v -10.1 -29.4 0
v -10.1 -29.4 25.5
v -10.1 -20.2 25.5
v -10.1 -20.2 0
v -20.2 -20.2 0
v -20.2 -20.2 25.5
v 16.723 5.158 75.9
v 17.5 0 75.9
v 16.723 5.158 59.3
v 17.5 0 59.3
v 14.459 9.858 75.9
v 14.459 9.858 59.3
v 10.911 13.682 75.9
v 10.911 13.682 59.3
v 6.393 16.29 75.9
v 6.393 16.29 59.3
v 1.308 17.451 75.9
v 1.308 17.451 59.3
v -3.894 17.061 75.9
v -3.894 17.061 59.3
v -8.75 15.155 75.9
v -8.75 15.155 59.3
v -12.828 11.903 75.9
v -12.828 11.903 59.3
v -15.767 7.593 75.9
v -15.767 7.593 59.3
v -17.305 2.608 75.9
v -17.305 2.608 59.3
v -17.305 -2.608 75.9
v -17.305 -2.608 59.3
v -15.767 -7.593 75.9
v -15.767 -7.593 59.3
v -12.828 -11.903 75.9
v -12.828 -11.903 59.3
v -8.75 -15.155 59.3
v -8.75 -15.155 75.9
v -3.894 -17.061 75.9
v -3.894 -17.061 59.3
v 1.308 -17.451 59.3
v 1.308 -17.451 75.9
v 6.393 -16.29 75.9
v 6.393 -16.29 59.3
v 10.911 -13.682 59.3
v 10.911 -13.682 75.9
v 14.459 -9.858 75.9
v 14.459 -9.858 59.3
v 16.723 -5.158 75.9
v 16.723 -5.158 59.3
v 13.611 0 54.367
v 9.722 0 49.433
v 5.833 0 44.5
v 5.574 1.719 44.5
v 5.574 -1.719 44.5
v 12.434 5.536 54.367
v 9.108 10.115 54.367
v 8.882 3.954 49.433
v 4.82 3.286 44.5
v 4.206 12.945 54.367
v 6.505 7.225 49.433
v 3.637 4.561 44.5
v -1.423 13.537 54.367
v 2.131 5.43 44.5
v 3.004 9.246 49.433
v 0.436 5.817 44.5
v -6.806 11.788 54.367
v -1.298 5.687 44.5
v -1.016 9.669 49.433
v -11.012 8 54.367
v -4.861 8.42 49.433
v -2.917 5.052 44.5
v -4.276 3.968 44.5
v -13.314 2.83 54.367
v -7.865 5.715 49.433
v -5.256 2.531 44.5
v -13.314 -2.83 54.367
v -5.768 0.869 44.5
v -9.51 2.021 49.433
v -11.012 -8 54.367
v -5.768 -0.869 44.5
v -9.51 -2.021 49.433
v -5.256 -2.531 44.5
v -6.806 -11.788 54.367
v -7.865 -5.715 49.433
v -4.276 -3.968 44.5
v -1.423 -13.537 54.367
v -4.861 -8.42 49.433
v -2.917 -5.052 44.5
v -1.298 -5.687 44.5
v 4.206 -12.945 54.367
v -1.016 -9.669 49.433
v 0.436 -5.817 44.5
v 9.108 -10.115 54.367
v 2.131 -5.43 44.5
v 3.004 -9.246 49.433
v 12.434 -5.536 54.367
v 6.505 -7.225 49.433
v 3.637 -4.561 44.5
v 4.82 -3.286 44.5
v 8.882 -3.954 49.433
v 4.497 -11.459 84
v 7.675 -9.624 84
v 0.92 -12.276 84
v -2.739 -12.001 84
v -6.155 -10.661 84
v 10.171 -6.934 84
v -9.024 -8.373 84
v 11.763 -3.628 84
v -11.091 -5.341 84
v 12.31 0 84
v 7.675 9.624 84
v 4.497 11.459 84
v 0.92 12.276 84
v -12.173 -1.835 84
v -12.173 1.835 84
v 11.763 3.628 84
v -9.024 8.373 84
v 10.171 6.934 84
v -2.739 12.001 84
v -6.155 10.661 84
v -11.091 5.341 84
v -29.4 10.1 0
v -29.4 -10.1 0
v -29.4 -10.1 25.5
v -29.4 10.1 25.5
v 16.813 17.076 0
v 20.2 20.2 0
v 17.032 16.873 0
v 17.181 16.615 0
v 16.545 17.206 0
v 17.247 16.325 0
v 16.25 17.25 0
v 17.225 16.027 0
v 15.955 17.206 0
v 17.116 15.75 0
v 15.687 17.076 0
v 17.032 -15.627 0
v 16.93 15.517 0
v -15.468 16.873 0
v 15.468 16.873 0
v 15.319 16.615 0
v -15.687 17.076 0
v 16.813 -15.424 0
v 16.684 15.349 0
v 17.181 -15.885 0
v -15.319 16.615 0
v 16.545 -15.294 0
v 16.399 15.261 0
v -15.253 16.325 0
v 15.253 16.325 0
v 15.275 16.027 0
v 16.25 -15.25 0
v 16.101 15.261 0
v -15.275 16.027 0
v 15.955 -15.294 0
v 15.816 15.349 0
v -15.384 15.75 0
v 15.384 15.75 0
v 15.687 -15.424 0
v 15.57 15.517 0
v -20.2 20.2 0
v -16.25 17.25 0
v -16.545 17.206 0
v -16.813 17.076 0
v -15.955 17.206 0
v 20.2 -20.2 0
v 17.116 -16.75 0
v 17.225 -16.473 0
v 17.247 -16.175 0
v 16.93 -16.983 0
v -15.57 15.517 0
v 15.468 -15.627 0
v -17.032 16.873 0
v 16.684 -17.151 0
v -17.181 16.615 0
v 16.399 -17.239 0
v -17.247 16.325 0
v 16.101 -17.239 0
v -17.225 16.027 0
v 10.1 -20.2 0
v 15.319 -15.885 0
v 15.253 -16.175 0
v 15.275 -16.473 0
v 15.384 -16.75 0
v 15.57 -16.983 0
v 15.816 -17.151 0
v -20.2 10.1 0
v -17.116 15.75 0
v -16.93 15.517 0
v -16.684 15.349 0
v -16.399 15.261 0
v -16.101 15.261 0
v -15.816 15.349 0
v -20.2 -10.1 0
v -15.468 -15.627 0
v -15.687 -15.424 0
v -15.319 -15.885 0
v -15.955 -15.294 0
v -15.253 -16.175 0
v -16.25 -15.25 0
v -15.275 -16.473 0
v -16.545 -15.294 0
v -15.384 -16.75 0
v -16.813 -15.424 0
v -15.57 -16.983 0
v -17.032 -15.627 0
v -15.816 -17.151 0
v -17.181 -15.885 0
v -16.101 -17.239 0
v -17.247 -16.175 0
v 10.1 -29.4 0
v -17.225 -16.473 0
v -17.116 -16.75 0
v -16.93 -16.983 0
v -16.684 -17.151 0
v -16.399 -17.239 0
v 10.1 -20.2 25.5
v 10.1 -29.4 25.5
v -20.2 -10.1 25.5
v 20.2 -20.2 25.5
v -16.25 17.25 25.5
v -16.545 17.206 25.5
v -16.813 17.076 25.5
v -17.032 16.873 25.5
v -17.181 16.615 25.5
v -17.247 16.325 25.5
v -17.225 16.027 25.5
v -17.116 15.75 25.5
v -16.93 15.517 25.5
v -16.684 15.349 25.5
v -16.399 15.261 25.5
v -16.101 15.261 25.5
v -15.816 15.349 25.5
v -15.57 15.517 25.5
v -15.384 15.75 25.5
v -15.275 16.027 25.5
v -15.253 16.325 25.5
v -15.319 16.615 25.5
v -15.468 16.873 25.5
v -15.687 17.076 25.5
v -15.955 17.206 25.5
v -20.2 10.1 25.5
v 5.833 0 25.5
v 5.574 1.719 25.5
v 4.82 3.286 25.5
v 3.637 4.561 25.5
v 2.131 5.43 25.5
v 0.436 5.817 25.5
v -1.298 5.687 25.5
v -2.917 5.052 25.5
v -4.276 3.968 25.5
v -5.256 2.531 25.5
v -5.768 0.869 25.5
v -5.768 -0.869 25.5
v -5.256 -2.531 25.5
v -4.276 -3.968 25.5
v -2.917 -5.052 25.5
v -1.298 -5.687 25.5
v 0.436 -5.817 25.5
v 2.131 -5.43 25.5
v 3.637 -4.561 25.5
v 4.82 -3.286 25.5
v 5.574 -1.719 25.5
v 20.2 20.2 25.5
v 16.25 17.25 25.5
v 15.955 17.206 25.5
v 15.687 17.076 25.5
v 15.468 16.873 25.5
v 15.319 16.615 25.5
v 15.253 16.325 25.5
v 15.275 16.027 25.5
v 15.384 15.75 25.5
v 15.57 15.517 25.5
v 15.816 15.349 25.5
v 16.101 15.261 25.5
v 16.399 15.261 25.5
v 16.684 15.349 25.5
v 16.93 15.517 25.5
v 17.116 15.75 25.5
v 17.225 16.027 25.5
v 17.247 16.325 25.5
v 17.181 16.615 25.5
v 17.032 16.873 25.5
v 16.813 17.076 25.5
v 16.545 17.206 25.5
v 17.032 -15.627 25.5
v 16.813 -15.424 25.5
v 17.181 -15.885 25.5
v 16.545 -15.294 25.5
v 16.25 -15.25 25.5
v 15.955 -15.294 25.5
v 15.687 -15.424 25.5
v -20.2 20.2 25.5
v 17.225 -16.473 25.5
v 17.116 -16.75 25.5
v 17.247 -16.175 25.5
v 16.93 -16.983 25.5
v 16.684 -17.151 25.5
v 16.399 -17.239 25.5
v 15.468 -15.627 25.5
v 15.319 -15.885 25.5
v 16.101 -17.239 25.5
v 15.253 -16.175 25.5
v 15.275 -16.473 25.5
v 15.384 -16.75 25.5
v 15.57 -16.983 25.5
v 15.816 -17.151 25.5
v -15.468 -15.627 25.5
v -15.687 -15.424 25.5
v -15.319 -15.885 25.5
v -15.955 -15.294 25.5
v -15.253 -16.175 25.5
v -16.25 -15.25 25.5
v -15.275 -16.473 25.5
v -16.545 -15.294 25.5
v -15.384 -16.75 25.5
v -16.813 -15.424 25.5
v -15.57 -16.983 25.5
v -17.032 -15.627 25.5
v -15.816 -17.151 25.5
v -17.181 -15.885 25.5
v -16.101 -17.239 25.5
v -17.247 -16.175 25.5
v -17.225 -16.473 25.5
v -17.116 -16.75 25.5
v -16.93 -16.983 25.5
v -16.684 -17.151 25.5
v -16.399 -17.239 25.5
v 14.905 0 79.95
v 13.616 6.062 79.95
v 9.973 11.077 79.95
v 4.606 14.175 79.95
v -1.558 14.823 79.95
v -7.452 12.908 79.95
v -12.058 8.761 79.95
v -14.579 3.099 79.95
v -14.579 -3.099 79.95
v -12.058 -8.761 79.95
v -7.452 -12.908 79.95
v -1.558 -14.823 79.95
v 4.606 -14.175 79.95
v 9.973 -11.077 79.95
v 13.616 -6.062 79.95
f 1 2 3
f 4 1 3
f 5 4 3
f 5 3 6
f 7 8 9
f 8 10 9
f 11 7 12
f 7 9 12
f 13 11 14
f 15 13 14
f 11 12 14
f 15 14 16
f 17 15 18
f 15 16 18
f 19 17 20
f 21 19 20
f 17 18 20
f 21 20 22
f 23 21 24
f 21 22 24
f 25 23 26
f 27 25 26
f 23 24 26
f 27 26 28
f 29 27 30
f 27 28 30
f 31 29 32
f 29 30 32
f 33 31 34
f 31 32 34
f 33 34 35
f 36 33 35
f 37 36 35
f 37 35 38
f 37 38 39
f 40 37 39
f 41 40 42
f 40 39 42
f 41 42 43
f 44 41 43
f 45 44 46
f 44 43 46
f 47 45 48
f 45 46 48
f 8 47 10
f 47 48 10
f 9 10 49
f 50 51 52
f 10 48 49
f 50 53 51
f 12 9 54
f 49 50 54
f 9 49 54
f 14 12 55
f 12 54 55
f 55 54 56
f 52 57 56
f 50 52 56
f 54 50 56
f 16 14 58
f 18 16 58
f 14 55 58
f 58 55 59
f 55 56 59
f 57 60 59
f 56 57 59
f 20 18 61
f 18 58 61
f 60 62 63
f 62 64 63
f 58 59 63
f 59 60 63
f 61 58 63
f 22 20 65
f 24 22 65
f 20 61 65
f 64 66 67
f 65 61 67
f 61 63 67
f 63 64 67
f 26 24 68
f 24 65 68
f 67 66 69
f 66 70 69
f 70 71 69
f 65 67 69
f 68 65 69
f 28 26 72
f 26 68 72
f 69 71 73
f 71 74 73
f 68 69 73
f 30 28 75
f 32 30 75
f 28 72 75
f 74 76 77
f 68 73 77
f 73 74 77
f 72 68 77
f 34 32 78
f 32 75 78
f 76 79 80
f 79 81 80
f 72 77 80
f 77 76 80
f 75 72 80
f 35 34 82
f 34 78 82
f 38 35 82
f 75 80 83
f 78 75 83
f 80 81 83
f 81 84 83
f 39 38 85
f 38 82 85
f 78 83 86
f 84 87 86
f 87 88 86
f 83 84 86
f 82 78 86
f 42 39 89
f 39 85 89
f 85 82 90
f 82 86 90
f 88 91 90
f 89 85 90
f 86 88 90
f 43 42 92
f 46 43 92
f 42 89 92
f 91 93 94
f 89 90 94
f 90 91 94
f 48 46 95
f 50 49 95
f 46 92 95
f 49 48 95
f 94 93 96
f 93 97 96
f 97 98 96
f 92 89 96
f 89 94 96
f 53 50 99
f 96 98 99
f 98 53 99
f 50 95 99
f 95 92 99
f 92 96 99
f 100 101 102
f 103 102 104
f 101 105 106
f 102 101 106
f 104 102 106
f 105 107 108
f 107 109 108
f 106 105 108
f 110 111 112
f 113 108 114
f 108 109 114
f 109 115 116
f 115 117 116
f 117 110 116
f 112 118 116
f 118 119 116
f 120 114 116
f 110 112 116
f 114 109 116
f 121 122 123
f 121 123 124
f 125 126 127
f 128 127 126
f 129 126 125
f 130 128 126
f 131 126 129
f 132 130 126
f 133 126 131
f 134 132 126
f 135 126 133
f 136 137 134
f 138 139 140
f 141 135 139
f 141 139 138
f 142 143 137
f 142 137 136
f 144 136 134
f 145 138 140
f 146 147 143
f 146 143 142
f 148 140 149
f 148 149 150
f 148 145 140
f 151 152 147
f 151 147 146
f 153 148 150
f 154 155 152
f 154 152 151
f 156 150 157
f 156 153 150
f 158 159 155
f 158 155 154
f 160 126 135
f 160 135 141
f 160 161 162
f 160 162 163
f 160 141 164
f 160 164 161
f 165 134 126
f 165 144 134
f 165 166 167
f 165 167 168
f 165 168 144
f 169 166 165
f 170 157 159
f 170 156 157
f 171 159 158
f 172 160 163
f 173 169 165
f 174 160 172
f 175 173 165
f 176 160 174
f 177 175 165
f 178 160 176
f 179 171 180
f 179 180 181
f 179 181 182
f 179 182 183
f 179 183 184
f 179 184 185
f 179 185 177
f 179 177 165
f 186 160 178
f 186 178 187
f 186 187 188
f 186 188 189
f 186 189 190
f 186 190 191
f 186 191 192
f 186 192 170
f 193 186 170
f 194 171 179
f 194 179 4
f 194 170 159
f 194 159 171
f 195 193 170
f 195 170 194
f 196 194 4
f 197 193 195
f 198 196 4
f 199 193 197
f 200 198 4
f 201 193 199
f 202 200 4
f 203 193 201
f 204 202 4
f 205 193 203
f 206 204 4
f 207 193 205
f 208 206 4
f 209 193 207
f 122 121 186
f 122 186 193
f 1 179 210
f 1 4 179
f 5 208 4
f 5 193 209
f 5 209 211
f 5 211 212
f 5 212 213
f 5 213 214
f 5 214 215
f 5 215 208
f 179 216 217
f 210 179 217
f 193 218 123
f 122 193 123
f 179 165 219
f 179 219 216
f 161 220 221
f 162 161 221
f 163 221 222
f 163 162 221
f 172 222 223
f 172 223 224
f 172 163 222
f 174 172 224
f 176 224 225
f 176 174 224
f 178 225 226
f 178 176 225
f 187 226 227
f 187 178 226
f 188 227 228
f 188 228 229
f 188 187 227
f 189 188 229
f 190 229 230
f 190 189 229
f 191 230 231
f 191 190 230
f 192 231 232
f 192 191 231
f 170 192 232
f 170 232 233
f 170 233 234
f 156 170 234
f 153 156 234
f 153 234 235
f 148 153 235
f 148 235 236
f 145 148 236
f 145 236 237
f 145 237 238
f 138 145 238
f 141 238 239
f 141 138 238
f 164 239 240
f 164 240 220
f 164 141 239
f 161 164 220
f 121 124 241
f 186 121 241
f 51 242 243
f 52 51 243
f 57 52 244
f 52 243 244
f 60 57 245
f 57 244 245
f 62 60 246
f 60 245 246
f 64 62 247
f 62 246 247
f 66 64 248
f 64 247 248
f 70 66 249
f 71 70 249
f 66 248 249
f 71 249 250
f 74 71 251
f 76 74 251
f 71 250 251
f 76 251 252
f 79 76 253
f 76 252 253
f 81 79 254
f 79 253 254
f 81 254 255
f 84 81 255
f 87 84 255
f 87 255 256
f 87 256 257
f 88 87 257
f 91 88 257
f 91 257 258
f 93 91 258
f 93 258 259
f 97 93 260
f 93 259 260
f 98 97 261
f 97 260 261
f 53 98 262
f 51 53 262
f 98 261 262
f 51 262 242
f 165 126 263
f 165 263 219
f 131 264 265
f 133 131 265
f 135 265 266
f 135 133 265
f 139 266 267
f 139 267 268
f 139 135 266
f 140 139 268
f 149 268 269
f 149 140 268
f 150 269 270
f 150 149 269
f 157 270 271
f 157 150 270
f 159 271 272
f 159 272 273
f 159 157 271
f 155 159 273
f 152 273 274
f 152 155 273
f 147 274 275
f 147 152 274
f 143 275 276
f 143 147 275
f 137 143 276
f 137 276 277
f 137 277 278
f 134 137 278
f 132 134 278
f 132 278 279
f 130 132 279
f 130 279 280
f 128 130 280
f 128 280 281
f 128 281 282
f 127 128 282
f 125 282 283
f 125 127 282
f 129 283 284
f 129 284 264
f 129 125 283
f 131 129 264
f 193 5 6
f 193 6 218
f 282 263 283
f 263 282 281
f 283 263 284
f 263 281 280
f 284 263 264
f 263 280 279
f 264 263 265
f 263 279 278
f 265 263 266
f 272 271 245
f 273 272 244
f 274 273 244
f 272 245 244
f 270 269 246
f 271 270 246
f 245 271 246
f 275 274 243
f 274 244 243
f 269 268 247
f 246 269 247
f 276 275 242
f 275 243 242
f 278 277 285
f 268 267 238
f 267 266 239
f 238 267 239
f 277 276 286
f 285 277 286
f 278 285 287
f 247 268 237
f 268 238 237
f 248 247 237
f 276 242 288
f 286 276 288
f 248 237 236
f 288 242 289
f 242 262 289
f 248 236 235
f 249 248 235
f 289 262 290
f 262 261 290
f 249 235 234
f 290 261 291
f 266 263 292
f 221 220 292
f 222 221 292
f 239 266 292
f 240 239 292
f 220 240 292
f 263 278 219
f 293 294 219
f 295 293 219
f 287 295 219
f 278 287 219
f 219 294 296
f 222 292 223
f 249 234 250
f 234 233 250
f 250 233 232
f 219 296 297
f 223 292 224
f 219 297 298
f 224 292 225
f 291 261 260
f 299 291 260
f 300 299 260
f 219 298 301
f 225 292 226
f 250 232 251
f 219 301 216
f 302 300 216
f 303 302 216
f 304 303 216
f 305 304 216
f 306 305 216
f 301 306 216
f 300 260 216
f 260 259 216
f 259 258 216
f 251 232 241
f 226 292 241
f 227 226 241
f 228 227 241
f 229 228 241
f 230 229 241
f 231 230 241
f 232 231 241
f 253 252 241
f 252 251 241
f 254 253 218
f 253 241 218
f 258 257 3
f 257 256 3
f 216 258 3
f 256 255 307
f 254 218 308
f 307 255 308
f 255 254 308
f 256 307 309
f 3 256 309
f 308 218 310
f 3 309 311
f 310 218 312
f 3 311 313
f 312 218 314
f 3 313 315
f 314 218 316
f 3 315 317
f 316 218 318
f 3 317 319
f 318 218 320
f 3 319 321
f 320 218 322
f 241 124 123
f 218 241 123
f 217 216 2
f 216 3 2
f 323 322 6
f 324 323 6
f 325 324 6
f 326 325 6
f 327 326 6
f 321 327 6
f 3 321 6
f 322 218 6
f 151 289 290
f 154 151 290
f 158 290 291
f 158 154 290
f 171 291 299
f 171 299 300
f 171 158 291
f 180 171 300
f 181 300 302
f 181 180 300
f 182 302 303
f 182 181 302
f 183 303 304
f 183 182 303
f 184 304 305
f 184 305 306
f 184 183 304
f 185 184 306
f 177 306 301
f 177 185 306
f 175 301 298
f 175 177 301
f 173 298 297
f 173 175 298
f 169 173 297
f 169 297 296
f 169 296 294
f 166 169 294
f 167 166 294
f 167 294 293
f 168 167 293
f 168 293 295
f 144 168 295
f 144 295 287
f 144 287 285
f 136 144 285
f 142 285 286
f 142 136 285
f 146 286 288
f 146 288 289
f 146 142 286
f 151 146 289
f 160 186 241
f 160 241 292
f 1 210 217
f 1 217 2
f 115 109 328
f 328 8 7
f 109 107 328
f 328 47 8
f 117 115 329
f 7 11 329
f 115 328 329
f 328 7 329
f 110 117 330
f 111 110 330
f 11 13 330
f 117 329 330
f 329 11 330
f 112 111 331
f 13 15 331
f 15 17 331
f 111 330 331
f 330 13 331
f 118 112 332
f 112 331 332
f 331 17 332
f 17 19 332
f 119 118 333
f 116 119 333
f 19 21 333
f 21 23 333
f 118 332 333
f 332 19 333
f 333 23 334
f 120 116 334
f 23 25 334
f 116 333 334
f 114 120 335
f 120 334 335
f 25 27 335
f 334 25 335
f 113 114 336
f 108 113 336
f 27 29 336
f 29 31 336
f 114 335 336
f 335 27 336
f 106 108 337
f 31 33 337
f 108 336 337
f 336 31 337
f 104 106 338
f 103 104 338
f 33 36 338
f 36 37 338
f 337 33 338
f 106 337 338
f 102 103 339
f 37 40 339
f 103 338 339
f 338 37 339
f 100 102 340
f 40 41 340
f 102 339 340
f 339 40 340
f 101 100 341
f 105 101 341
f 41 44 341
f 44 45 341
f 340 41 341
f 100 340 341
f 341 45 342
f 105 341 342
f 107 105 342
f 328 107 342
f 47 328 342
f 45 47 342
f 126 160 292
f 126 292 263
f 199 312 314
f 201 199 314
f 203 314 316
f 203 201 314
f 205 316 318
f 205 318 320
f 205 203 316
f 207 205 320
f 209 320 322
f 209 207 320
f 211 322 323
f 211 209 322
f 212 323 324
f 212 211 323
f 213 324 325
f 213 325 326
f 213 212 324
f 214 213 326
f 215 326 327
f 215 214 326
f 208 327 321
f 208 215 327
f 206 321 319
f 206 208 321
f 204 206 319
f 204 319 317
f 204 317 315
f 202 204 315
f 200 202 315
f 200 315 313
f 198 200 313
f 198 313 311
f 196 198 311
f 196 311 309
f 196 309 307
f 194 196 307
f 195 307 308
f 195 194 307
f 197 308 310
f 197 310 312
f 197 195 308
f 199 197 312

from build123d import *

# Parameters (mm, degrees)
SKETCH003_R  = 1
PAD001_DEPTH = 25.5


with BuildPart() as part:
    # Sketch003 → Pad001 (new body)
    with BuildSketch(Plane(origin=(0, 0, 0), x_dir=(0, 1, 0), z_dir=(0, 0, 1))):
        Polygon((20.2, 20.2), (20.2, -20.2), (-20.2, -20.2), (-20.2, -10.1), (-29.4, -10.1), (-29.4, 10.1), (-20.2, 10.1), (-20.2, 20.2), (-10.1, 20.2), (-10.1, 29.4), (10.1, 29.4), (10.1, 20.2), align=None)
        with Locations((-16.25, 16.25)):
            Circle(SKETCH003_R, mode=Mode.SUBTRACT)
        with Locations((16.25, 16.25)):
            Circle(SKETCH003_R, mode=Mode.SUBTRACT)
        with Locations((16.25, -16.25)):
            Circle(SKETCH003_R, mode=Mode.SUBTRACT)
        with Locations((-16.25, -16.25)):
            Circle(SKETCH003_R, mode=Mode.SUBTRACT)
    extrude(amount=PAD001_DEPTH)

    # Sketch004 → Revolution (revolve)
    with BuildSketch(Plane.XZ):
        Polygon((0, 84), (12.31, 84), (17.5, 75.9), (17.5, 59.3), (5.833333, 44.5), (5.833333, 12.75), (0, 12.75), align=None)
    revolve(axis=Axis((0, 0, 0), (0, 0, 1)))


solid = part.part
